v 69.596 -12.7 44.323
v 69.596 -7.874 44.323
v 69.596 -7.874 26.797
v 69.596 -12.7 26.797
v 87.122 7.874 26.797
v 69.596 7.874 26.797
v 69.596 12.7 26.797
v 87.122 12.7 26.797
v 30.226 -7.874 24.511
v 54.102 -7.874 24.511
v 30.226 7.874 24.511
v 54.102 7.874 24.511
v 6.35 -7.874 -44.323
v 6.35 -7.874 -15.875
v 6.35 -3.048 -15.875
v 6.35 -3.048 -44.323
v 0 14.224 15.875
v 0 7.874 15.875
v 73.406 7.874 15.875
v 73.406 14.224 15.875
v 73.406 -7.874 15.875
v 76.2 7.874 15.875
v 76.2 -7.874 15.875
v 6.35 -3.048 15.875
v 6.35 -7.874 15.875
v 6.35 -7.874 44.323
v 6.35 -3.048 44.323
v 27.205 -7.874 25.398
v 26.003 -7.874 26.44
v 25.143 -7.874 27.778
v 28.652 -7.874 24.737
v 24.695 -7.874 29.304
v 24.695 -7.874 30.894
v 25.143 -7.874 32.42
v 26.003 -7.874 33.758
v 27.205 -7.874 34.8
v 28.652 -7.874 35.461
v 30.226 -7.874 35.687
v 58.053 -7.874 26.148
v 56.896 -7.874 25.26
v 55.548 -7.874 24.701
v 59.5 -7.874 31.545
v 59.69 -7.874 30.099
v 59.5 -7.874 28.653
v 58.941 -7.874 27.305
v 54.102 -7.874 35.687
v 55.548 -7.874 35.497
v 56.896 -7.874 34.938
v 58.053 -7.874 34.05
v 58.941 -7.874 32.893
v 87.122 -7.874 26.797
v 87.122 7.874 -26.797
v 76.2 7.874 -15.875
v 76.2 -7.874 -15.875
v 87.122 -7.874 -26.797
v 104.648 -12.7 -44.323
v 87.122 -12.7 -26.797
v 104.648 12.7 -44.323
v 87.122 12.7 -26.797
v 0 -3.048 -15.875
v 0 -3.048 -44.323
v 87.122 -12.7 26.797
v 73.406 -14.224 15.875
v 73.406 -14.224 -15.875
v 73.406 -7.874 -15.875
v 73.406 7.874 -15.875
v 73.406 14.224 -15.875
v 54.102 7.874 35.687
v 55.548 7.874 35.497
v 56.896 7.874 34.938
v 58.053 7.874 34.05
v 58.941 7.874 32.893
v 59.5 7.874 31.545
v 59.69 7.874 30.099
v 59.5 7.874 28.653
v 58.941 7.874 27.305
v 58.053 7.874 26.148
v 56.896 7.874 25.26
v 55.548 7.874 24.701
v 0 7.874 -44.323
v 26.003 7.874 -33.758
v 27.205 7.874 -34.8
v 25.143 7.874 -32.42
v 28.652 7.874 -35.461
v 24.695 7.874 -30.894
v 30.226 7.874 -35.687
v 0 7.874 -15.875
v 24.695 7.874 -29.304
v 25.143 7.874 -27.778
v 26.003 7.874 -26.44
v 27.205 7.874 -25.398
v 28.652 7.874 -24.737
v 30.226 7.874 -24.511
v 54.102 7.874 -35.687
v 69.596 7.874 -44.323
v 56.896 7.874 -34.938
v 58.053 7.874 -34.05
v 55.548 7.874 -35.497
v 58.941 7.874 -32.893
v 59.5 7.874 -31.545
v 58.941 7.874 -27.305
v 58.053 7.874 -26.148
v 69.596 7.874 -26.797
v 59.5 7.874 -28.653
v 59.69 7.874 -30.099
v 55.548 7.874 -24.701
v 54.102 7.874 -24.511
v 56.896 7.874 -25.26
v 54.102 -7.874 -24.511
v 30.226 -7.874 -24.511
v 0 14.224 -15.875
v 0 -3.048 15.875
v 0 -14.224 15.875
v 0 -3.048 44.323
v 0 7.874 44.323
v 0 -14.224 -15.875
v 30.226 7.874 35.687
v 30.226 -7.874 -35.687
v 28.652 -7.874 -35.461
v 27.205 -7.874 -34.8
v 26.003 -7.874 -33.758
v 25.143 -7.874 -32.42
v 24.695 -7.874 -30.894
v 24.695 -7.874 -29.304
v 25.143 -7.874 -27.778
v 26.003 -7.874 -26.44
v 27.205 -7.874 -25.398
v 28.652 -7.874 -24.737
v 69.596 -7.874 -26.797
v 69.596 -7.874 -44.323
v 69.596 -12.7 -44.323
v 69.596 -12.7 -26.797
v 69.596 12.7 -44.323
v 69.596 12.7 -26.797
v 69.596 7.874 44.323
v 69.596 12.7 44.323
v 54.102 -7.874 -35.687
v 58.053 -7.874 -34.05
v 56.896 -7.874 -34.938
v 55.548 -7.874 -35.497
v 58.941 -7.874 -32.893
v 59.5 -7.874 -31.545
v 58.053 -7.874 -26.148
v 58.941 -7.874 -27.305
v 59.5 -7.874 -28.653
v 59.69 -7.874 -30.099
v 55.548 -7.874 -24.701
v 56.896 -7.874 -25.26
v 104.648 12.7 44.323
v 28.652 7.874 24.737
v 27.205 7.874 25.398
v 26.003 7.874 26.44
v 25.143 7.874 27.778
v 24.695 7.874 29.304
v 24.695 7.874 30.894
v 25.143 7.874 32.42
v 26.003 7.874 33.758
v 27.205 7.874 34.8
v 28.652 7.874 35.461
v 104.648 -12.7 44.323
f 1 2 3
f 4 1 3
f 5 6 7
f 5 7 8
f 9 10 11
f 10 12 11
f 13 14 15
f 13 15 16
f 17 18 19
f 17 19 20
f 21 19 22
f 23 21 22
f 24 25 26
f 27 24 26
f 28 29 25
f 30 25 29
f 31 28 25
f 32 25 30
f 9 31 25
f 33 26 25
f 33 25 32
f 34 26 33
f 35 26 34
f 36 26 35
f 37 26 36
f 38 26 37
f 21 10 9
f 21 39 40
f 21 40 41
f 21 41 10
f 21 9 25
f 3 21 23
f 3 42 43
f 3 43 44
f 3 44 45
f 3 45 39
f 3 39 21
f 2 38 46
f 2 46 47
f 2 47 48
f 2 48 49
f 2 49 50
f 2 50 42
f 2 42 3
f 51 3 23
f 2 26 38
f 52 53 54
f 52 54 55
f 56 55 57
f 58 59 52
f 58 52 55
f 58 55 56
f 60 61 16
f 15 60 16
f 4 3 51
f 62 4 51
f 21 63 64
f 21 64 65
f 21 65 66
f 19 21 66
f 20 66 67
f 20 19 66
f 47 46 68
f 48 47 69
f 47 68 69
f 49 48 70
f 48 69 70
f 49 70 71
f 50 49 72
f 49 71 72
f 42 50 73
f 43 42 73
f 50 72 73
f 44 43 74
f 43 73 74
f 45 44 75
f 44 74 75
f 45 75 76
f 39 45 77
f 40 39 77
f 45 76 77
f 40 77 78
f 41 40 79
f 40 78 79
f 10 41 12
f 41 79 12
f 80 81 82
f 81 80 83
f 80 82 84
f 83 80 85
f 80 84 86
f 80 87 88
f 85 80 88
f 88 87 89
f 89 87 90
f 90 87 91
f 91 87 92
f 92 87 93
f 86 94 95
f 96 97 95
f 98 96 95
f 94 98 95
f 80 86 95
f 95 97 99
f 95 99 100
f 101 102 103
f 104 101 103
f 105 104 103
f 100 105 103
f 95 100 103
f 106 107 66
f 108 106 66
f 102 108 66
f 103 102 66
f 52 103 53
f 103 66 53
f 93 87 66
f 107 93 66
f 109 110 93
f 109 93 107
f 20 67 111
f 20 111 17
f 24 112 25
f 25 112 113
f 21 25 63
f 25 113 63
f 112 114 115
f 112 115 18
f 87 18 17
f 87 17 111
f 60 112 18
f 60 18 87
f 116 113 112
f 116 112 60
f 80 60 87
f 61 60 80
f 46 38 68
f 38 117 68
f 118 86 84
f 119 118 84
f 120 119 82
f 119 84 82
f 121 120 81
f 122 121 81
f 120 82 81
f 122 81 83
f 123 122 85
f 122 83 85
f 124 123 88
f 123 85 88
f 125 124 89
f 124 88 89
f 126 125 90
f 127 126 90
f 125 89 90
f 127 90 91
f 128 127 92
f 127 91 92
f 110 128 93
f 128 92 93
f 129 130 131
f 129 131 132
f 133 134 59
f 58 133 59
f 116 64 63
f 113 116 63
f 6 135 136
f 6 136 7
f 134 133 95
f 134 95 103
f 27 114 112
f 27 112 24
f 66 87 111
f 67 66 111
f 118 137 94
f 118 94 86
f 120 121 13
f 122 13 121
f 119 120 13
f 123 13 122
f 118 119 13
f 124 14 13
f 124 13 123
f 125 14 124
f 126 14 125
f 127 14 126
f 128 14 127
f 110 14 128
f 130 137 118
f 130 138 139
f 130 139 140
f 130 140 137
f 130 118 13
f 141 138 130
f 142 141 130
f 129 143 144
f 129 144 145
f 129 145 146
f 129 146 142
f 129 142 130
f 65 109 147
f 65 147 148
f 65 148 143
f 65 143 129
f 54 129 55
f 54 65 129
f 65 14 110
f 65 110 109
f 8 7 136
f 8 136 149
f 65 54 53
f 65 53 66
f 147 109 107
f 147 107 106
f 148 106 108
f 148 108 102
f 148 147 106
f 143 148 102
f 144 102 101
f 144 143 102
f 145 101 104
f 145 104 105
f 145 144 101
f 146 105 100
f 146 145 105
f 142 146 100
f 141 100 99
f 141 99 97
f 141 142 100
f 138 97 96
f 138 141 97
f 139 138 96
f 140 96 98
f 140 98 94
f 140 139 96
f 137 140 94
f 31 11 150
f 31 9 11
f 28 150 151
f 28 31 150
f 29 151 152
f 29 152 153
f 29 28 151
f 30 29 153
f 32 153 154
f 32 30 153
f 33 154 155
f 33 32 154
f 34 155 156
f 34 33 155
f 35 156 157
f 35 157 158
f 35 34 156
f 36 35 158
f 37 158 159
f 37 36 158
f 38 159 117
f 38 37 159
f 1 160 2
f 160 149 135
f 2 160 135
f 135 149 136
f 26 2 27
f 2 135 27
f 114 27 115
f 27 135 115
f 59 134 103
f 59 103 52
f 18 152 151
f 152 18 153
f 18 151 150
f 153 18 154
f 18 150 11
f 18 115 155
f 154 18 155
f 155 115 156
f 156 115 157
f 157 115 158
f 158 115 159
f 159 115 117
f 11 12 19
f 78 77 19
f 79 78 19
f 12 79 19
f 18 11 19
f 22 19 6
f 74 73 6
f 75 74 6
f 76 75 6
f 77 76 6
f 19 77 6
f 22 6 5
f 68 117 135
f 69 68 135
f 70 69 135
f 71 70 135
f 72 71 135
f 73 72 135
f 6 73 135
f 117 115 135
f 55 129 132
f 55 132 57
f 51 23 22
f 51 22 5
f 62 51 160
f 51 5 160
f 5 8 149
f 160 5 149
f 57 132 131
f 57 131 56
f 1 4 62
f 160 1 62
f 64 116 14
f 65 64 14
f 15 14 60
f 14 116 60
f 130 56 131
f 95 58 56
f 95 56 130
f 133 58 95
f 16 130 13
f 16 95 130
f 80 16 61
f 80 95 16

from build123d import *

# Parameters (mm, degrees)
F0_W          = 28.448
F0_H          = 31.75
F1_DEPTH      = 73.406
F3_DEPTH      = 7.874
F4_W          = 6.35
F4_H          = 28.448
F5_DEPTH      = 4.826
F6_DEPTH      = 4.826
F6_DEPTH_BACK = 20.574


# Not quite as in the source:
# - a pattern or mirror of a feature is missing from the dataset's text; its kind, count and spacing are read off the source's solid


with BuildPart() as f1:
    # F0 (on Right) → F1 (new body)
    with BuildSketch(Plane.YZ):
        Rectangle(F0_W, F0_H)
    extrude(amount=F1_DEPTH)

    # F2 (on Front) → F3 (join, symmetric)
    with BuildSketch(Plane.XZ):
        Polygon((0, 15.875), (73.406, 15.875), (76.2, 15.875), (104.648, 44.323), (0, 44.323), align=None)
        with BuildLine():
            ThreePointArc((30.226, 24.511), (24.638, 30.099), (30.226, 35.687))
            Line((30.226, 35.687), (54.102, 35.687))
            ThreePointArc((54.102, 35.687), (58.0533126933, 34.0503126933), (59.69, 30.099))
            ThreePointArc((59.69, 30.099), (58.0533126933, 26.1476873067), (54.102, 24.511))
            Line((54.102, 24.511), (30.226, 24.511))
        make_face(mode=Mode.SUBTRACT)
        Polygon((104.648, -44.323), (76.2, -15.875), (73.406, -15.875), (0, -15.875), (0, -44.323), align=None)
        with BuildLine():
            ThreePointArc((30.226, -35.687), (24.638, -30.099), (30.226, -24.511))
            Line((30.226, -24.511), (54.102, -24.511))
            ThreePointArc((54.102, -24.511), (58.0533126933, -26.1476873067), (59.69, -30.099))
            ThreePointArc((59.69, -30.099), (58.0533126933, -34.0503126933), (54.102, -35.687))
            Line((54.102, -35.687), (30.226, -35.687))
        make_face(mode=Mode.SUBTRACT)
    extrude(amount=F3_DEPTH, both=True)

    # F4 (on face) → F5 (cut)
    with BuildSketch(Plane.XZ.offset(7.874)):
        with Locations((3.175, 30.099)):
            Rectangle(F4_W, F4_H)
    f5 = extrude(amount=-F5_DEPTH, mode=Mode.SUBTRACT)

    # F5_copies: F5 across plane
    add(f5.mirror(Plane(origin=(0, 0, 0), x_dir=(-1, 0, 0), z_dir=(0, 0, -1))), mode=Mode.SUBTRACT)

    # F4 (on face) → F6 (join, two sides)
    with BuildSketch(Plane.XZ.offset(7.874)) as f6_sk:
        Polygon((104.648, 44.323), (69.596, 44.323), (69.596, 26.797), (87.122, 26.797), align=None)
    f6 = extrude(amount=F6_DEPTH) + extrude(f6_sk.sketch, amount=-F6_DEPTH_BACK)

    # F6_copies: F6 across plane
    add(f6.mirror(Plane(origin=(0, 0, 0), x_dir=(-1, 0, 0), z_dir=(0, 0, -1))))


solid = f1.part
